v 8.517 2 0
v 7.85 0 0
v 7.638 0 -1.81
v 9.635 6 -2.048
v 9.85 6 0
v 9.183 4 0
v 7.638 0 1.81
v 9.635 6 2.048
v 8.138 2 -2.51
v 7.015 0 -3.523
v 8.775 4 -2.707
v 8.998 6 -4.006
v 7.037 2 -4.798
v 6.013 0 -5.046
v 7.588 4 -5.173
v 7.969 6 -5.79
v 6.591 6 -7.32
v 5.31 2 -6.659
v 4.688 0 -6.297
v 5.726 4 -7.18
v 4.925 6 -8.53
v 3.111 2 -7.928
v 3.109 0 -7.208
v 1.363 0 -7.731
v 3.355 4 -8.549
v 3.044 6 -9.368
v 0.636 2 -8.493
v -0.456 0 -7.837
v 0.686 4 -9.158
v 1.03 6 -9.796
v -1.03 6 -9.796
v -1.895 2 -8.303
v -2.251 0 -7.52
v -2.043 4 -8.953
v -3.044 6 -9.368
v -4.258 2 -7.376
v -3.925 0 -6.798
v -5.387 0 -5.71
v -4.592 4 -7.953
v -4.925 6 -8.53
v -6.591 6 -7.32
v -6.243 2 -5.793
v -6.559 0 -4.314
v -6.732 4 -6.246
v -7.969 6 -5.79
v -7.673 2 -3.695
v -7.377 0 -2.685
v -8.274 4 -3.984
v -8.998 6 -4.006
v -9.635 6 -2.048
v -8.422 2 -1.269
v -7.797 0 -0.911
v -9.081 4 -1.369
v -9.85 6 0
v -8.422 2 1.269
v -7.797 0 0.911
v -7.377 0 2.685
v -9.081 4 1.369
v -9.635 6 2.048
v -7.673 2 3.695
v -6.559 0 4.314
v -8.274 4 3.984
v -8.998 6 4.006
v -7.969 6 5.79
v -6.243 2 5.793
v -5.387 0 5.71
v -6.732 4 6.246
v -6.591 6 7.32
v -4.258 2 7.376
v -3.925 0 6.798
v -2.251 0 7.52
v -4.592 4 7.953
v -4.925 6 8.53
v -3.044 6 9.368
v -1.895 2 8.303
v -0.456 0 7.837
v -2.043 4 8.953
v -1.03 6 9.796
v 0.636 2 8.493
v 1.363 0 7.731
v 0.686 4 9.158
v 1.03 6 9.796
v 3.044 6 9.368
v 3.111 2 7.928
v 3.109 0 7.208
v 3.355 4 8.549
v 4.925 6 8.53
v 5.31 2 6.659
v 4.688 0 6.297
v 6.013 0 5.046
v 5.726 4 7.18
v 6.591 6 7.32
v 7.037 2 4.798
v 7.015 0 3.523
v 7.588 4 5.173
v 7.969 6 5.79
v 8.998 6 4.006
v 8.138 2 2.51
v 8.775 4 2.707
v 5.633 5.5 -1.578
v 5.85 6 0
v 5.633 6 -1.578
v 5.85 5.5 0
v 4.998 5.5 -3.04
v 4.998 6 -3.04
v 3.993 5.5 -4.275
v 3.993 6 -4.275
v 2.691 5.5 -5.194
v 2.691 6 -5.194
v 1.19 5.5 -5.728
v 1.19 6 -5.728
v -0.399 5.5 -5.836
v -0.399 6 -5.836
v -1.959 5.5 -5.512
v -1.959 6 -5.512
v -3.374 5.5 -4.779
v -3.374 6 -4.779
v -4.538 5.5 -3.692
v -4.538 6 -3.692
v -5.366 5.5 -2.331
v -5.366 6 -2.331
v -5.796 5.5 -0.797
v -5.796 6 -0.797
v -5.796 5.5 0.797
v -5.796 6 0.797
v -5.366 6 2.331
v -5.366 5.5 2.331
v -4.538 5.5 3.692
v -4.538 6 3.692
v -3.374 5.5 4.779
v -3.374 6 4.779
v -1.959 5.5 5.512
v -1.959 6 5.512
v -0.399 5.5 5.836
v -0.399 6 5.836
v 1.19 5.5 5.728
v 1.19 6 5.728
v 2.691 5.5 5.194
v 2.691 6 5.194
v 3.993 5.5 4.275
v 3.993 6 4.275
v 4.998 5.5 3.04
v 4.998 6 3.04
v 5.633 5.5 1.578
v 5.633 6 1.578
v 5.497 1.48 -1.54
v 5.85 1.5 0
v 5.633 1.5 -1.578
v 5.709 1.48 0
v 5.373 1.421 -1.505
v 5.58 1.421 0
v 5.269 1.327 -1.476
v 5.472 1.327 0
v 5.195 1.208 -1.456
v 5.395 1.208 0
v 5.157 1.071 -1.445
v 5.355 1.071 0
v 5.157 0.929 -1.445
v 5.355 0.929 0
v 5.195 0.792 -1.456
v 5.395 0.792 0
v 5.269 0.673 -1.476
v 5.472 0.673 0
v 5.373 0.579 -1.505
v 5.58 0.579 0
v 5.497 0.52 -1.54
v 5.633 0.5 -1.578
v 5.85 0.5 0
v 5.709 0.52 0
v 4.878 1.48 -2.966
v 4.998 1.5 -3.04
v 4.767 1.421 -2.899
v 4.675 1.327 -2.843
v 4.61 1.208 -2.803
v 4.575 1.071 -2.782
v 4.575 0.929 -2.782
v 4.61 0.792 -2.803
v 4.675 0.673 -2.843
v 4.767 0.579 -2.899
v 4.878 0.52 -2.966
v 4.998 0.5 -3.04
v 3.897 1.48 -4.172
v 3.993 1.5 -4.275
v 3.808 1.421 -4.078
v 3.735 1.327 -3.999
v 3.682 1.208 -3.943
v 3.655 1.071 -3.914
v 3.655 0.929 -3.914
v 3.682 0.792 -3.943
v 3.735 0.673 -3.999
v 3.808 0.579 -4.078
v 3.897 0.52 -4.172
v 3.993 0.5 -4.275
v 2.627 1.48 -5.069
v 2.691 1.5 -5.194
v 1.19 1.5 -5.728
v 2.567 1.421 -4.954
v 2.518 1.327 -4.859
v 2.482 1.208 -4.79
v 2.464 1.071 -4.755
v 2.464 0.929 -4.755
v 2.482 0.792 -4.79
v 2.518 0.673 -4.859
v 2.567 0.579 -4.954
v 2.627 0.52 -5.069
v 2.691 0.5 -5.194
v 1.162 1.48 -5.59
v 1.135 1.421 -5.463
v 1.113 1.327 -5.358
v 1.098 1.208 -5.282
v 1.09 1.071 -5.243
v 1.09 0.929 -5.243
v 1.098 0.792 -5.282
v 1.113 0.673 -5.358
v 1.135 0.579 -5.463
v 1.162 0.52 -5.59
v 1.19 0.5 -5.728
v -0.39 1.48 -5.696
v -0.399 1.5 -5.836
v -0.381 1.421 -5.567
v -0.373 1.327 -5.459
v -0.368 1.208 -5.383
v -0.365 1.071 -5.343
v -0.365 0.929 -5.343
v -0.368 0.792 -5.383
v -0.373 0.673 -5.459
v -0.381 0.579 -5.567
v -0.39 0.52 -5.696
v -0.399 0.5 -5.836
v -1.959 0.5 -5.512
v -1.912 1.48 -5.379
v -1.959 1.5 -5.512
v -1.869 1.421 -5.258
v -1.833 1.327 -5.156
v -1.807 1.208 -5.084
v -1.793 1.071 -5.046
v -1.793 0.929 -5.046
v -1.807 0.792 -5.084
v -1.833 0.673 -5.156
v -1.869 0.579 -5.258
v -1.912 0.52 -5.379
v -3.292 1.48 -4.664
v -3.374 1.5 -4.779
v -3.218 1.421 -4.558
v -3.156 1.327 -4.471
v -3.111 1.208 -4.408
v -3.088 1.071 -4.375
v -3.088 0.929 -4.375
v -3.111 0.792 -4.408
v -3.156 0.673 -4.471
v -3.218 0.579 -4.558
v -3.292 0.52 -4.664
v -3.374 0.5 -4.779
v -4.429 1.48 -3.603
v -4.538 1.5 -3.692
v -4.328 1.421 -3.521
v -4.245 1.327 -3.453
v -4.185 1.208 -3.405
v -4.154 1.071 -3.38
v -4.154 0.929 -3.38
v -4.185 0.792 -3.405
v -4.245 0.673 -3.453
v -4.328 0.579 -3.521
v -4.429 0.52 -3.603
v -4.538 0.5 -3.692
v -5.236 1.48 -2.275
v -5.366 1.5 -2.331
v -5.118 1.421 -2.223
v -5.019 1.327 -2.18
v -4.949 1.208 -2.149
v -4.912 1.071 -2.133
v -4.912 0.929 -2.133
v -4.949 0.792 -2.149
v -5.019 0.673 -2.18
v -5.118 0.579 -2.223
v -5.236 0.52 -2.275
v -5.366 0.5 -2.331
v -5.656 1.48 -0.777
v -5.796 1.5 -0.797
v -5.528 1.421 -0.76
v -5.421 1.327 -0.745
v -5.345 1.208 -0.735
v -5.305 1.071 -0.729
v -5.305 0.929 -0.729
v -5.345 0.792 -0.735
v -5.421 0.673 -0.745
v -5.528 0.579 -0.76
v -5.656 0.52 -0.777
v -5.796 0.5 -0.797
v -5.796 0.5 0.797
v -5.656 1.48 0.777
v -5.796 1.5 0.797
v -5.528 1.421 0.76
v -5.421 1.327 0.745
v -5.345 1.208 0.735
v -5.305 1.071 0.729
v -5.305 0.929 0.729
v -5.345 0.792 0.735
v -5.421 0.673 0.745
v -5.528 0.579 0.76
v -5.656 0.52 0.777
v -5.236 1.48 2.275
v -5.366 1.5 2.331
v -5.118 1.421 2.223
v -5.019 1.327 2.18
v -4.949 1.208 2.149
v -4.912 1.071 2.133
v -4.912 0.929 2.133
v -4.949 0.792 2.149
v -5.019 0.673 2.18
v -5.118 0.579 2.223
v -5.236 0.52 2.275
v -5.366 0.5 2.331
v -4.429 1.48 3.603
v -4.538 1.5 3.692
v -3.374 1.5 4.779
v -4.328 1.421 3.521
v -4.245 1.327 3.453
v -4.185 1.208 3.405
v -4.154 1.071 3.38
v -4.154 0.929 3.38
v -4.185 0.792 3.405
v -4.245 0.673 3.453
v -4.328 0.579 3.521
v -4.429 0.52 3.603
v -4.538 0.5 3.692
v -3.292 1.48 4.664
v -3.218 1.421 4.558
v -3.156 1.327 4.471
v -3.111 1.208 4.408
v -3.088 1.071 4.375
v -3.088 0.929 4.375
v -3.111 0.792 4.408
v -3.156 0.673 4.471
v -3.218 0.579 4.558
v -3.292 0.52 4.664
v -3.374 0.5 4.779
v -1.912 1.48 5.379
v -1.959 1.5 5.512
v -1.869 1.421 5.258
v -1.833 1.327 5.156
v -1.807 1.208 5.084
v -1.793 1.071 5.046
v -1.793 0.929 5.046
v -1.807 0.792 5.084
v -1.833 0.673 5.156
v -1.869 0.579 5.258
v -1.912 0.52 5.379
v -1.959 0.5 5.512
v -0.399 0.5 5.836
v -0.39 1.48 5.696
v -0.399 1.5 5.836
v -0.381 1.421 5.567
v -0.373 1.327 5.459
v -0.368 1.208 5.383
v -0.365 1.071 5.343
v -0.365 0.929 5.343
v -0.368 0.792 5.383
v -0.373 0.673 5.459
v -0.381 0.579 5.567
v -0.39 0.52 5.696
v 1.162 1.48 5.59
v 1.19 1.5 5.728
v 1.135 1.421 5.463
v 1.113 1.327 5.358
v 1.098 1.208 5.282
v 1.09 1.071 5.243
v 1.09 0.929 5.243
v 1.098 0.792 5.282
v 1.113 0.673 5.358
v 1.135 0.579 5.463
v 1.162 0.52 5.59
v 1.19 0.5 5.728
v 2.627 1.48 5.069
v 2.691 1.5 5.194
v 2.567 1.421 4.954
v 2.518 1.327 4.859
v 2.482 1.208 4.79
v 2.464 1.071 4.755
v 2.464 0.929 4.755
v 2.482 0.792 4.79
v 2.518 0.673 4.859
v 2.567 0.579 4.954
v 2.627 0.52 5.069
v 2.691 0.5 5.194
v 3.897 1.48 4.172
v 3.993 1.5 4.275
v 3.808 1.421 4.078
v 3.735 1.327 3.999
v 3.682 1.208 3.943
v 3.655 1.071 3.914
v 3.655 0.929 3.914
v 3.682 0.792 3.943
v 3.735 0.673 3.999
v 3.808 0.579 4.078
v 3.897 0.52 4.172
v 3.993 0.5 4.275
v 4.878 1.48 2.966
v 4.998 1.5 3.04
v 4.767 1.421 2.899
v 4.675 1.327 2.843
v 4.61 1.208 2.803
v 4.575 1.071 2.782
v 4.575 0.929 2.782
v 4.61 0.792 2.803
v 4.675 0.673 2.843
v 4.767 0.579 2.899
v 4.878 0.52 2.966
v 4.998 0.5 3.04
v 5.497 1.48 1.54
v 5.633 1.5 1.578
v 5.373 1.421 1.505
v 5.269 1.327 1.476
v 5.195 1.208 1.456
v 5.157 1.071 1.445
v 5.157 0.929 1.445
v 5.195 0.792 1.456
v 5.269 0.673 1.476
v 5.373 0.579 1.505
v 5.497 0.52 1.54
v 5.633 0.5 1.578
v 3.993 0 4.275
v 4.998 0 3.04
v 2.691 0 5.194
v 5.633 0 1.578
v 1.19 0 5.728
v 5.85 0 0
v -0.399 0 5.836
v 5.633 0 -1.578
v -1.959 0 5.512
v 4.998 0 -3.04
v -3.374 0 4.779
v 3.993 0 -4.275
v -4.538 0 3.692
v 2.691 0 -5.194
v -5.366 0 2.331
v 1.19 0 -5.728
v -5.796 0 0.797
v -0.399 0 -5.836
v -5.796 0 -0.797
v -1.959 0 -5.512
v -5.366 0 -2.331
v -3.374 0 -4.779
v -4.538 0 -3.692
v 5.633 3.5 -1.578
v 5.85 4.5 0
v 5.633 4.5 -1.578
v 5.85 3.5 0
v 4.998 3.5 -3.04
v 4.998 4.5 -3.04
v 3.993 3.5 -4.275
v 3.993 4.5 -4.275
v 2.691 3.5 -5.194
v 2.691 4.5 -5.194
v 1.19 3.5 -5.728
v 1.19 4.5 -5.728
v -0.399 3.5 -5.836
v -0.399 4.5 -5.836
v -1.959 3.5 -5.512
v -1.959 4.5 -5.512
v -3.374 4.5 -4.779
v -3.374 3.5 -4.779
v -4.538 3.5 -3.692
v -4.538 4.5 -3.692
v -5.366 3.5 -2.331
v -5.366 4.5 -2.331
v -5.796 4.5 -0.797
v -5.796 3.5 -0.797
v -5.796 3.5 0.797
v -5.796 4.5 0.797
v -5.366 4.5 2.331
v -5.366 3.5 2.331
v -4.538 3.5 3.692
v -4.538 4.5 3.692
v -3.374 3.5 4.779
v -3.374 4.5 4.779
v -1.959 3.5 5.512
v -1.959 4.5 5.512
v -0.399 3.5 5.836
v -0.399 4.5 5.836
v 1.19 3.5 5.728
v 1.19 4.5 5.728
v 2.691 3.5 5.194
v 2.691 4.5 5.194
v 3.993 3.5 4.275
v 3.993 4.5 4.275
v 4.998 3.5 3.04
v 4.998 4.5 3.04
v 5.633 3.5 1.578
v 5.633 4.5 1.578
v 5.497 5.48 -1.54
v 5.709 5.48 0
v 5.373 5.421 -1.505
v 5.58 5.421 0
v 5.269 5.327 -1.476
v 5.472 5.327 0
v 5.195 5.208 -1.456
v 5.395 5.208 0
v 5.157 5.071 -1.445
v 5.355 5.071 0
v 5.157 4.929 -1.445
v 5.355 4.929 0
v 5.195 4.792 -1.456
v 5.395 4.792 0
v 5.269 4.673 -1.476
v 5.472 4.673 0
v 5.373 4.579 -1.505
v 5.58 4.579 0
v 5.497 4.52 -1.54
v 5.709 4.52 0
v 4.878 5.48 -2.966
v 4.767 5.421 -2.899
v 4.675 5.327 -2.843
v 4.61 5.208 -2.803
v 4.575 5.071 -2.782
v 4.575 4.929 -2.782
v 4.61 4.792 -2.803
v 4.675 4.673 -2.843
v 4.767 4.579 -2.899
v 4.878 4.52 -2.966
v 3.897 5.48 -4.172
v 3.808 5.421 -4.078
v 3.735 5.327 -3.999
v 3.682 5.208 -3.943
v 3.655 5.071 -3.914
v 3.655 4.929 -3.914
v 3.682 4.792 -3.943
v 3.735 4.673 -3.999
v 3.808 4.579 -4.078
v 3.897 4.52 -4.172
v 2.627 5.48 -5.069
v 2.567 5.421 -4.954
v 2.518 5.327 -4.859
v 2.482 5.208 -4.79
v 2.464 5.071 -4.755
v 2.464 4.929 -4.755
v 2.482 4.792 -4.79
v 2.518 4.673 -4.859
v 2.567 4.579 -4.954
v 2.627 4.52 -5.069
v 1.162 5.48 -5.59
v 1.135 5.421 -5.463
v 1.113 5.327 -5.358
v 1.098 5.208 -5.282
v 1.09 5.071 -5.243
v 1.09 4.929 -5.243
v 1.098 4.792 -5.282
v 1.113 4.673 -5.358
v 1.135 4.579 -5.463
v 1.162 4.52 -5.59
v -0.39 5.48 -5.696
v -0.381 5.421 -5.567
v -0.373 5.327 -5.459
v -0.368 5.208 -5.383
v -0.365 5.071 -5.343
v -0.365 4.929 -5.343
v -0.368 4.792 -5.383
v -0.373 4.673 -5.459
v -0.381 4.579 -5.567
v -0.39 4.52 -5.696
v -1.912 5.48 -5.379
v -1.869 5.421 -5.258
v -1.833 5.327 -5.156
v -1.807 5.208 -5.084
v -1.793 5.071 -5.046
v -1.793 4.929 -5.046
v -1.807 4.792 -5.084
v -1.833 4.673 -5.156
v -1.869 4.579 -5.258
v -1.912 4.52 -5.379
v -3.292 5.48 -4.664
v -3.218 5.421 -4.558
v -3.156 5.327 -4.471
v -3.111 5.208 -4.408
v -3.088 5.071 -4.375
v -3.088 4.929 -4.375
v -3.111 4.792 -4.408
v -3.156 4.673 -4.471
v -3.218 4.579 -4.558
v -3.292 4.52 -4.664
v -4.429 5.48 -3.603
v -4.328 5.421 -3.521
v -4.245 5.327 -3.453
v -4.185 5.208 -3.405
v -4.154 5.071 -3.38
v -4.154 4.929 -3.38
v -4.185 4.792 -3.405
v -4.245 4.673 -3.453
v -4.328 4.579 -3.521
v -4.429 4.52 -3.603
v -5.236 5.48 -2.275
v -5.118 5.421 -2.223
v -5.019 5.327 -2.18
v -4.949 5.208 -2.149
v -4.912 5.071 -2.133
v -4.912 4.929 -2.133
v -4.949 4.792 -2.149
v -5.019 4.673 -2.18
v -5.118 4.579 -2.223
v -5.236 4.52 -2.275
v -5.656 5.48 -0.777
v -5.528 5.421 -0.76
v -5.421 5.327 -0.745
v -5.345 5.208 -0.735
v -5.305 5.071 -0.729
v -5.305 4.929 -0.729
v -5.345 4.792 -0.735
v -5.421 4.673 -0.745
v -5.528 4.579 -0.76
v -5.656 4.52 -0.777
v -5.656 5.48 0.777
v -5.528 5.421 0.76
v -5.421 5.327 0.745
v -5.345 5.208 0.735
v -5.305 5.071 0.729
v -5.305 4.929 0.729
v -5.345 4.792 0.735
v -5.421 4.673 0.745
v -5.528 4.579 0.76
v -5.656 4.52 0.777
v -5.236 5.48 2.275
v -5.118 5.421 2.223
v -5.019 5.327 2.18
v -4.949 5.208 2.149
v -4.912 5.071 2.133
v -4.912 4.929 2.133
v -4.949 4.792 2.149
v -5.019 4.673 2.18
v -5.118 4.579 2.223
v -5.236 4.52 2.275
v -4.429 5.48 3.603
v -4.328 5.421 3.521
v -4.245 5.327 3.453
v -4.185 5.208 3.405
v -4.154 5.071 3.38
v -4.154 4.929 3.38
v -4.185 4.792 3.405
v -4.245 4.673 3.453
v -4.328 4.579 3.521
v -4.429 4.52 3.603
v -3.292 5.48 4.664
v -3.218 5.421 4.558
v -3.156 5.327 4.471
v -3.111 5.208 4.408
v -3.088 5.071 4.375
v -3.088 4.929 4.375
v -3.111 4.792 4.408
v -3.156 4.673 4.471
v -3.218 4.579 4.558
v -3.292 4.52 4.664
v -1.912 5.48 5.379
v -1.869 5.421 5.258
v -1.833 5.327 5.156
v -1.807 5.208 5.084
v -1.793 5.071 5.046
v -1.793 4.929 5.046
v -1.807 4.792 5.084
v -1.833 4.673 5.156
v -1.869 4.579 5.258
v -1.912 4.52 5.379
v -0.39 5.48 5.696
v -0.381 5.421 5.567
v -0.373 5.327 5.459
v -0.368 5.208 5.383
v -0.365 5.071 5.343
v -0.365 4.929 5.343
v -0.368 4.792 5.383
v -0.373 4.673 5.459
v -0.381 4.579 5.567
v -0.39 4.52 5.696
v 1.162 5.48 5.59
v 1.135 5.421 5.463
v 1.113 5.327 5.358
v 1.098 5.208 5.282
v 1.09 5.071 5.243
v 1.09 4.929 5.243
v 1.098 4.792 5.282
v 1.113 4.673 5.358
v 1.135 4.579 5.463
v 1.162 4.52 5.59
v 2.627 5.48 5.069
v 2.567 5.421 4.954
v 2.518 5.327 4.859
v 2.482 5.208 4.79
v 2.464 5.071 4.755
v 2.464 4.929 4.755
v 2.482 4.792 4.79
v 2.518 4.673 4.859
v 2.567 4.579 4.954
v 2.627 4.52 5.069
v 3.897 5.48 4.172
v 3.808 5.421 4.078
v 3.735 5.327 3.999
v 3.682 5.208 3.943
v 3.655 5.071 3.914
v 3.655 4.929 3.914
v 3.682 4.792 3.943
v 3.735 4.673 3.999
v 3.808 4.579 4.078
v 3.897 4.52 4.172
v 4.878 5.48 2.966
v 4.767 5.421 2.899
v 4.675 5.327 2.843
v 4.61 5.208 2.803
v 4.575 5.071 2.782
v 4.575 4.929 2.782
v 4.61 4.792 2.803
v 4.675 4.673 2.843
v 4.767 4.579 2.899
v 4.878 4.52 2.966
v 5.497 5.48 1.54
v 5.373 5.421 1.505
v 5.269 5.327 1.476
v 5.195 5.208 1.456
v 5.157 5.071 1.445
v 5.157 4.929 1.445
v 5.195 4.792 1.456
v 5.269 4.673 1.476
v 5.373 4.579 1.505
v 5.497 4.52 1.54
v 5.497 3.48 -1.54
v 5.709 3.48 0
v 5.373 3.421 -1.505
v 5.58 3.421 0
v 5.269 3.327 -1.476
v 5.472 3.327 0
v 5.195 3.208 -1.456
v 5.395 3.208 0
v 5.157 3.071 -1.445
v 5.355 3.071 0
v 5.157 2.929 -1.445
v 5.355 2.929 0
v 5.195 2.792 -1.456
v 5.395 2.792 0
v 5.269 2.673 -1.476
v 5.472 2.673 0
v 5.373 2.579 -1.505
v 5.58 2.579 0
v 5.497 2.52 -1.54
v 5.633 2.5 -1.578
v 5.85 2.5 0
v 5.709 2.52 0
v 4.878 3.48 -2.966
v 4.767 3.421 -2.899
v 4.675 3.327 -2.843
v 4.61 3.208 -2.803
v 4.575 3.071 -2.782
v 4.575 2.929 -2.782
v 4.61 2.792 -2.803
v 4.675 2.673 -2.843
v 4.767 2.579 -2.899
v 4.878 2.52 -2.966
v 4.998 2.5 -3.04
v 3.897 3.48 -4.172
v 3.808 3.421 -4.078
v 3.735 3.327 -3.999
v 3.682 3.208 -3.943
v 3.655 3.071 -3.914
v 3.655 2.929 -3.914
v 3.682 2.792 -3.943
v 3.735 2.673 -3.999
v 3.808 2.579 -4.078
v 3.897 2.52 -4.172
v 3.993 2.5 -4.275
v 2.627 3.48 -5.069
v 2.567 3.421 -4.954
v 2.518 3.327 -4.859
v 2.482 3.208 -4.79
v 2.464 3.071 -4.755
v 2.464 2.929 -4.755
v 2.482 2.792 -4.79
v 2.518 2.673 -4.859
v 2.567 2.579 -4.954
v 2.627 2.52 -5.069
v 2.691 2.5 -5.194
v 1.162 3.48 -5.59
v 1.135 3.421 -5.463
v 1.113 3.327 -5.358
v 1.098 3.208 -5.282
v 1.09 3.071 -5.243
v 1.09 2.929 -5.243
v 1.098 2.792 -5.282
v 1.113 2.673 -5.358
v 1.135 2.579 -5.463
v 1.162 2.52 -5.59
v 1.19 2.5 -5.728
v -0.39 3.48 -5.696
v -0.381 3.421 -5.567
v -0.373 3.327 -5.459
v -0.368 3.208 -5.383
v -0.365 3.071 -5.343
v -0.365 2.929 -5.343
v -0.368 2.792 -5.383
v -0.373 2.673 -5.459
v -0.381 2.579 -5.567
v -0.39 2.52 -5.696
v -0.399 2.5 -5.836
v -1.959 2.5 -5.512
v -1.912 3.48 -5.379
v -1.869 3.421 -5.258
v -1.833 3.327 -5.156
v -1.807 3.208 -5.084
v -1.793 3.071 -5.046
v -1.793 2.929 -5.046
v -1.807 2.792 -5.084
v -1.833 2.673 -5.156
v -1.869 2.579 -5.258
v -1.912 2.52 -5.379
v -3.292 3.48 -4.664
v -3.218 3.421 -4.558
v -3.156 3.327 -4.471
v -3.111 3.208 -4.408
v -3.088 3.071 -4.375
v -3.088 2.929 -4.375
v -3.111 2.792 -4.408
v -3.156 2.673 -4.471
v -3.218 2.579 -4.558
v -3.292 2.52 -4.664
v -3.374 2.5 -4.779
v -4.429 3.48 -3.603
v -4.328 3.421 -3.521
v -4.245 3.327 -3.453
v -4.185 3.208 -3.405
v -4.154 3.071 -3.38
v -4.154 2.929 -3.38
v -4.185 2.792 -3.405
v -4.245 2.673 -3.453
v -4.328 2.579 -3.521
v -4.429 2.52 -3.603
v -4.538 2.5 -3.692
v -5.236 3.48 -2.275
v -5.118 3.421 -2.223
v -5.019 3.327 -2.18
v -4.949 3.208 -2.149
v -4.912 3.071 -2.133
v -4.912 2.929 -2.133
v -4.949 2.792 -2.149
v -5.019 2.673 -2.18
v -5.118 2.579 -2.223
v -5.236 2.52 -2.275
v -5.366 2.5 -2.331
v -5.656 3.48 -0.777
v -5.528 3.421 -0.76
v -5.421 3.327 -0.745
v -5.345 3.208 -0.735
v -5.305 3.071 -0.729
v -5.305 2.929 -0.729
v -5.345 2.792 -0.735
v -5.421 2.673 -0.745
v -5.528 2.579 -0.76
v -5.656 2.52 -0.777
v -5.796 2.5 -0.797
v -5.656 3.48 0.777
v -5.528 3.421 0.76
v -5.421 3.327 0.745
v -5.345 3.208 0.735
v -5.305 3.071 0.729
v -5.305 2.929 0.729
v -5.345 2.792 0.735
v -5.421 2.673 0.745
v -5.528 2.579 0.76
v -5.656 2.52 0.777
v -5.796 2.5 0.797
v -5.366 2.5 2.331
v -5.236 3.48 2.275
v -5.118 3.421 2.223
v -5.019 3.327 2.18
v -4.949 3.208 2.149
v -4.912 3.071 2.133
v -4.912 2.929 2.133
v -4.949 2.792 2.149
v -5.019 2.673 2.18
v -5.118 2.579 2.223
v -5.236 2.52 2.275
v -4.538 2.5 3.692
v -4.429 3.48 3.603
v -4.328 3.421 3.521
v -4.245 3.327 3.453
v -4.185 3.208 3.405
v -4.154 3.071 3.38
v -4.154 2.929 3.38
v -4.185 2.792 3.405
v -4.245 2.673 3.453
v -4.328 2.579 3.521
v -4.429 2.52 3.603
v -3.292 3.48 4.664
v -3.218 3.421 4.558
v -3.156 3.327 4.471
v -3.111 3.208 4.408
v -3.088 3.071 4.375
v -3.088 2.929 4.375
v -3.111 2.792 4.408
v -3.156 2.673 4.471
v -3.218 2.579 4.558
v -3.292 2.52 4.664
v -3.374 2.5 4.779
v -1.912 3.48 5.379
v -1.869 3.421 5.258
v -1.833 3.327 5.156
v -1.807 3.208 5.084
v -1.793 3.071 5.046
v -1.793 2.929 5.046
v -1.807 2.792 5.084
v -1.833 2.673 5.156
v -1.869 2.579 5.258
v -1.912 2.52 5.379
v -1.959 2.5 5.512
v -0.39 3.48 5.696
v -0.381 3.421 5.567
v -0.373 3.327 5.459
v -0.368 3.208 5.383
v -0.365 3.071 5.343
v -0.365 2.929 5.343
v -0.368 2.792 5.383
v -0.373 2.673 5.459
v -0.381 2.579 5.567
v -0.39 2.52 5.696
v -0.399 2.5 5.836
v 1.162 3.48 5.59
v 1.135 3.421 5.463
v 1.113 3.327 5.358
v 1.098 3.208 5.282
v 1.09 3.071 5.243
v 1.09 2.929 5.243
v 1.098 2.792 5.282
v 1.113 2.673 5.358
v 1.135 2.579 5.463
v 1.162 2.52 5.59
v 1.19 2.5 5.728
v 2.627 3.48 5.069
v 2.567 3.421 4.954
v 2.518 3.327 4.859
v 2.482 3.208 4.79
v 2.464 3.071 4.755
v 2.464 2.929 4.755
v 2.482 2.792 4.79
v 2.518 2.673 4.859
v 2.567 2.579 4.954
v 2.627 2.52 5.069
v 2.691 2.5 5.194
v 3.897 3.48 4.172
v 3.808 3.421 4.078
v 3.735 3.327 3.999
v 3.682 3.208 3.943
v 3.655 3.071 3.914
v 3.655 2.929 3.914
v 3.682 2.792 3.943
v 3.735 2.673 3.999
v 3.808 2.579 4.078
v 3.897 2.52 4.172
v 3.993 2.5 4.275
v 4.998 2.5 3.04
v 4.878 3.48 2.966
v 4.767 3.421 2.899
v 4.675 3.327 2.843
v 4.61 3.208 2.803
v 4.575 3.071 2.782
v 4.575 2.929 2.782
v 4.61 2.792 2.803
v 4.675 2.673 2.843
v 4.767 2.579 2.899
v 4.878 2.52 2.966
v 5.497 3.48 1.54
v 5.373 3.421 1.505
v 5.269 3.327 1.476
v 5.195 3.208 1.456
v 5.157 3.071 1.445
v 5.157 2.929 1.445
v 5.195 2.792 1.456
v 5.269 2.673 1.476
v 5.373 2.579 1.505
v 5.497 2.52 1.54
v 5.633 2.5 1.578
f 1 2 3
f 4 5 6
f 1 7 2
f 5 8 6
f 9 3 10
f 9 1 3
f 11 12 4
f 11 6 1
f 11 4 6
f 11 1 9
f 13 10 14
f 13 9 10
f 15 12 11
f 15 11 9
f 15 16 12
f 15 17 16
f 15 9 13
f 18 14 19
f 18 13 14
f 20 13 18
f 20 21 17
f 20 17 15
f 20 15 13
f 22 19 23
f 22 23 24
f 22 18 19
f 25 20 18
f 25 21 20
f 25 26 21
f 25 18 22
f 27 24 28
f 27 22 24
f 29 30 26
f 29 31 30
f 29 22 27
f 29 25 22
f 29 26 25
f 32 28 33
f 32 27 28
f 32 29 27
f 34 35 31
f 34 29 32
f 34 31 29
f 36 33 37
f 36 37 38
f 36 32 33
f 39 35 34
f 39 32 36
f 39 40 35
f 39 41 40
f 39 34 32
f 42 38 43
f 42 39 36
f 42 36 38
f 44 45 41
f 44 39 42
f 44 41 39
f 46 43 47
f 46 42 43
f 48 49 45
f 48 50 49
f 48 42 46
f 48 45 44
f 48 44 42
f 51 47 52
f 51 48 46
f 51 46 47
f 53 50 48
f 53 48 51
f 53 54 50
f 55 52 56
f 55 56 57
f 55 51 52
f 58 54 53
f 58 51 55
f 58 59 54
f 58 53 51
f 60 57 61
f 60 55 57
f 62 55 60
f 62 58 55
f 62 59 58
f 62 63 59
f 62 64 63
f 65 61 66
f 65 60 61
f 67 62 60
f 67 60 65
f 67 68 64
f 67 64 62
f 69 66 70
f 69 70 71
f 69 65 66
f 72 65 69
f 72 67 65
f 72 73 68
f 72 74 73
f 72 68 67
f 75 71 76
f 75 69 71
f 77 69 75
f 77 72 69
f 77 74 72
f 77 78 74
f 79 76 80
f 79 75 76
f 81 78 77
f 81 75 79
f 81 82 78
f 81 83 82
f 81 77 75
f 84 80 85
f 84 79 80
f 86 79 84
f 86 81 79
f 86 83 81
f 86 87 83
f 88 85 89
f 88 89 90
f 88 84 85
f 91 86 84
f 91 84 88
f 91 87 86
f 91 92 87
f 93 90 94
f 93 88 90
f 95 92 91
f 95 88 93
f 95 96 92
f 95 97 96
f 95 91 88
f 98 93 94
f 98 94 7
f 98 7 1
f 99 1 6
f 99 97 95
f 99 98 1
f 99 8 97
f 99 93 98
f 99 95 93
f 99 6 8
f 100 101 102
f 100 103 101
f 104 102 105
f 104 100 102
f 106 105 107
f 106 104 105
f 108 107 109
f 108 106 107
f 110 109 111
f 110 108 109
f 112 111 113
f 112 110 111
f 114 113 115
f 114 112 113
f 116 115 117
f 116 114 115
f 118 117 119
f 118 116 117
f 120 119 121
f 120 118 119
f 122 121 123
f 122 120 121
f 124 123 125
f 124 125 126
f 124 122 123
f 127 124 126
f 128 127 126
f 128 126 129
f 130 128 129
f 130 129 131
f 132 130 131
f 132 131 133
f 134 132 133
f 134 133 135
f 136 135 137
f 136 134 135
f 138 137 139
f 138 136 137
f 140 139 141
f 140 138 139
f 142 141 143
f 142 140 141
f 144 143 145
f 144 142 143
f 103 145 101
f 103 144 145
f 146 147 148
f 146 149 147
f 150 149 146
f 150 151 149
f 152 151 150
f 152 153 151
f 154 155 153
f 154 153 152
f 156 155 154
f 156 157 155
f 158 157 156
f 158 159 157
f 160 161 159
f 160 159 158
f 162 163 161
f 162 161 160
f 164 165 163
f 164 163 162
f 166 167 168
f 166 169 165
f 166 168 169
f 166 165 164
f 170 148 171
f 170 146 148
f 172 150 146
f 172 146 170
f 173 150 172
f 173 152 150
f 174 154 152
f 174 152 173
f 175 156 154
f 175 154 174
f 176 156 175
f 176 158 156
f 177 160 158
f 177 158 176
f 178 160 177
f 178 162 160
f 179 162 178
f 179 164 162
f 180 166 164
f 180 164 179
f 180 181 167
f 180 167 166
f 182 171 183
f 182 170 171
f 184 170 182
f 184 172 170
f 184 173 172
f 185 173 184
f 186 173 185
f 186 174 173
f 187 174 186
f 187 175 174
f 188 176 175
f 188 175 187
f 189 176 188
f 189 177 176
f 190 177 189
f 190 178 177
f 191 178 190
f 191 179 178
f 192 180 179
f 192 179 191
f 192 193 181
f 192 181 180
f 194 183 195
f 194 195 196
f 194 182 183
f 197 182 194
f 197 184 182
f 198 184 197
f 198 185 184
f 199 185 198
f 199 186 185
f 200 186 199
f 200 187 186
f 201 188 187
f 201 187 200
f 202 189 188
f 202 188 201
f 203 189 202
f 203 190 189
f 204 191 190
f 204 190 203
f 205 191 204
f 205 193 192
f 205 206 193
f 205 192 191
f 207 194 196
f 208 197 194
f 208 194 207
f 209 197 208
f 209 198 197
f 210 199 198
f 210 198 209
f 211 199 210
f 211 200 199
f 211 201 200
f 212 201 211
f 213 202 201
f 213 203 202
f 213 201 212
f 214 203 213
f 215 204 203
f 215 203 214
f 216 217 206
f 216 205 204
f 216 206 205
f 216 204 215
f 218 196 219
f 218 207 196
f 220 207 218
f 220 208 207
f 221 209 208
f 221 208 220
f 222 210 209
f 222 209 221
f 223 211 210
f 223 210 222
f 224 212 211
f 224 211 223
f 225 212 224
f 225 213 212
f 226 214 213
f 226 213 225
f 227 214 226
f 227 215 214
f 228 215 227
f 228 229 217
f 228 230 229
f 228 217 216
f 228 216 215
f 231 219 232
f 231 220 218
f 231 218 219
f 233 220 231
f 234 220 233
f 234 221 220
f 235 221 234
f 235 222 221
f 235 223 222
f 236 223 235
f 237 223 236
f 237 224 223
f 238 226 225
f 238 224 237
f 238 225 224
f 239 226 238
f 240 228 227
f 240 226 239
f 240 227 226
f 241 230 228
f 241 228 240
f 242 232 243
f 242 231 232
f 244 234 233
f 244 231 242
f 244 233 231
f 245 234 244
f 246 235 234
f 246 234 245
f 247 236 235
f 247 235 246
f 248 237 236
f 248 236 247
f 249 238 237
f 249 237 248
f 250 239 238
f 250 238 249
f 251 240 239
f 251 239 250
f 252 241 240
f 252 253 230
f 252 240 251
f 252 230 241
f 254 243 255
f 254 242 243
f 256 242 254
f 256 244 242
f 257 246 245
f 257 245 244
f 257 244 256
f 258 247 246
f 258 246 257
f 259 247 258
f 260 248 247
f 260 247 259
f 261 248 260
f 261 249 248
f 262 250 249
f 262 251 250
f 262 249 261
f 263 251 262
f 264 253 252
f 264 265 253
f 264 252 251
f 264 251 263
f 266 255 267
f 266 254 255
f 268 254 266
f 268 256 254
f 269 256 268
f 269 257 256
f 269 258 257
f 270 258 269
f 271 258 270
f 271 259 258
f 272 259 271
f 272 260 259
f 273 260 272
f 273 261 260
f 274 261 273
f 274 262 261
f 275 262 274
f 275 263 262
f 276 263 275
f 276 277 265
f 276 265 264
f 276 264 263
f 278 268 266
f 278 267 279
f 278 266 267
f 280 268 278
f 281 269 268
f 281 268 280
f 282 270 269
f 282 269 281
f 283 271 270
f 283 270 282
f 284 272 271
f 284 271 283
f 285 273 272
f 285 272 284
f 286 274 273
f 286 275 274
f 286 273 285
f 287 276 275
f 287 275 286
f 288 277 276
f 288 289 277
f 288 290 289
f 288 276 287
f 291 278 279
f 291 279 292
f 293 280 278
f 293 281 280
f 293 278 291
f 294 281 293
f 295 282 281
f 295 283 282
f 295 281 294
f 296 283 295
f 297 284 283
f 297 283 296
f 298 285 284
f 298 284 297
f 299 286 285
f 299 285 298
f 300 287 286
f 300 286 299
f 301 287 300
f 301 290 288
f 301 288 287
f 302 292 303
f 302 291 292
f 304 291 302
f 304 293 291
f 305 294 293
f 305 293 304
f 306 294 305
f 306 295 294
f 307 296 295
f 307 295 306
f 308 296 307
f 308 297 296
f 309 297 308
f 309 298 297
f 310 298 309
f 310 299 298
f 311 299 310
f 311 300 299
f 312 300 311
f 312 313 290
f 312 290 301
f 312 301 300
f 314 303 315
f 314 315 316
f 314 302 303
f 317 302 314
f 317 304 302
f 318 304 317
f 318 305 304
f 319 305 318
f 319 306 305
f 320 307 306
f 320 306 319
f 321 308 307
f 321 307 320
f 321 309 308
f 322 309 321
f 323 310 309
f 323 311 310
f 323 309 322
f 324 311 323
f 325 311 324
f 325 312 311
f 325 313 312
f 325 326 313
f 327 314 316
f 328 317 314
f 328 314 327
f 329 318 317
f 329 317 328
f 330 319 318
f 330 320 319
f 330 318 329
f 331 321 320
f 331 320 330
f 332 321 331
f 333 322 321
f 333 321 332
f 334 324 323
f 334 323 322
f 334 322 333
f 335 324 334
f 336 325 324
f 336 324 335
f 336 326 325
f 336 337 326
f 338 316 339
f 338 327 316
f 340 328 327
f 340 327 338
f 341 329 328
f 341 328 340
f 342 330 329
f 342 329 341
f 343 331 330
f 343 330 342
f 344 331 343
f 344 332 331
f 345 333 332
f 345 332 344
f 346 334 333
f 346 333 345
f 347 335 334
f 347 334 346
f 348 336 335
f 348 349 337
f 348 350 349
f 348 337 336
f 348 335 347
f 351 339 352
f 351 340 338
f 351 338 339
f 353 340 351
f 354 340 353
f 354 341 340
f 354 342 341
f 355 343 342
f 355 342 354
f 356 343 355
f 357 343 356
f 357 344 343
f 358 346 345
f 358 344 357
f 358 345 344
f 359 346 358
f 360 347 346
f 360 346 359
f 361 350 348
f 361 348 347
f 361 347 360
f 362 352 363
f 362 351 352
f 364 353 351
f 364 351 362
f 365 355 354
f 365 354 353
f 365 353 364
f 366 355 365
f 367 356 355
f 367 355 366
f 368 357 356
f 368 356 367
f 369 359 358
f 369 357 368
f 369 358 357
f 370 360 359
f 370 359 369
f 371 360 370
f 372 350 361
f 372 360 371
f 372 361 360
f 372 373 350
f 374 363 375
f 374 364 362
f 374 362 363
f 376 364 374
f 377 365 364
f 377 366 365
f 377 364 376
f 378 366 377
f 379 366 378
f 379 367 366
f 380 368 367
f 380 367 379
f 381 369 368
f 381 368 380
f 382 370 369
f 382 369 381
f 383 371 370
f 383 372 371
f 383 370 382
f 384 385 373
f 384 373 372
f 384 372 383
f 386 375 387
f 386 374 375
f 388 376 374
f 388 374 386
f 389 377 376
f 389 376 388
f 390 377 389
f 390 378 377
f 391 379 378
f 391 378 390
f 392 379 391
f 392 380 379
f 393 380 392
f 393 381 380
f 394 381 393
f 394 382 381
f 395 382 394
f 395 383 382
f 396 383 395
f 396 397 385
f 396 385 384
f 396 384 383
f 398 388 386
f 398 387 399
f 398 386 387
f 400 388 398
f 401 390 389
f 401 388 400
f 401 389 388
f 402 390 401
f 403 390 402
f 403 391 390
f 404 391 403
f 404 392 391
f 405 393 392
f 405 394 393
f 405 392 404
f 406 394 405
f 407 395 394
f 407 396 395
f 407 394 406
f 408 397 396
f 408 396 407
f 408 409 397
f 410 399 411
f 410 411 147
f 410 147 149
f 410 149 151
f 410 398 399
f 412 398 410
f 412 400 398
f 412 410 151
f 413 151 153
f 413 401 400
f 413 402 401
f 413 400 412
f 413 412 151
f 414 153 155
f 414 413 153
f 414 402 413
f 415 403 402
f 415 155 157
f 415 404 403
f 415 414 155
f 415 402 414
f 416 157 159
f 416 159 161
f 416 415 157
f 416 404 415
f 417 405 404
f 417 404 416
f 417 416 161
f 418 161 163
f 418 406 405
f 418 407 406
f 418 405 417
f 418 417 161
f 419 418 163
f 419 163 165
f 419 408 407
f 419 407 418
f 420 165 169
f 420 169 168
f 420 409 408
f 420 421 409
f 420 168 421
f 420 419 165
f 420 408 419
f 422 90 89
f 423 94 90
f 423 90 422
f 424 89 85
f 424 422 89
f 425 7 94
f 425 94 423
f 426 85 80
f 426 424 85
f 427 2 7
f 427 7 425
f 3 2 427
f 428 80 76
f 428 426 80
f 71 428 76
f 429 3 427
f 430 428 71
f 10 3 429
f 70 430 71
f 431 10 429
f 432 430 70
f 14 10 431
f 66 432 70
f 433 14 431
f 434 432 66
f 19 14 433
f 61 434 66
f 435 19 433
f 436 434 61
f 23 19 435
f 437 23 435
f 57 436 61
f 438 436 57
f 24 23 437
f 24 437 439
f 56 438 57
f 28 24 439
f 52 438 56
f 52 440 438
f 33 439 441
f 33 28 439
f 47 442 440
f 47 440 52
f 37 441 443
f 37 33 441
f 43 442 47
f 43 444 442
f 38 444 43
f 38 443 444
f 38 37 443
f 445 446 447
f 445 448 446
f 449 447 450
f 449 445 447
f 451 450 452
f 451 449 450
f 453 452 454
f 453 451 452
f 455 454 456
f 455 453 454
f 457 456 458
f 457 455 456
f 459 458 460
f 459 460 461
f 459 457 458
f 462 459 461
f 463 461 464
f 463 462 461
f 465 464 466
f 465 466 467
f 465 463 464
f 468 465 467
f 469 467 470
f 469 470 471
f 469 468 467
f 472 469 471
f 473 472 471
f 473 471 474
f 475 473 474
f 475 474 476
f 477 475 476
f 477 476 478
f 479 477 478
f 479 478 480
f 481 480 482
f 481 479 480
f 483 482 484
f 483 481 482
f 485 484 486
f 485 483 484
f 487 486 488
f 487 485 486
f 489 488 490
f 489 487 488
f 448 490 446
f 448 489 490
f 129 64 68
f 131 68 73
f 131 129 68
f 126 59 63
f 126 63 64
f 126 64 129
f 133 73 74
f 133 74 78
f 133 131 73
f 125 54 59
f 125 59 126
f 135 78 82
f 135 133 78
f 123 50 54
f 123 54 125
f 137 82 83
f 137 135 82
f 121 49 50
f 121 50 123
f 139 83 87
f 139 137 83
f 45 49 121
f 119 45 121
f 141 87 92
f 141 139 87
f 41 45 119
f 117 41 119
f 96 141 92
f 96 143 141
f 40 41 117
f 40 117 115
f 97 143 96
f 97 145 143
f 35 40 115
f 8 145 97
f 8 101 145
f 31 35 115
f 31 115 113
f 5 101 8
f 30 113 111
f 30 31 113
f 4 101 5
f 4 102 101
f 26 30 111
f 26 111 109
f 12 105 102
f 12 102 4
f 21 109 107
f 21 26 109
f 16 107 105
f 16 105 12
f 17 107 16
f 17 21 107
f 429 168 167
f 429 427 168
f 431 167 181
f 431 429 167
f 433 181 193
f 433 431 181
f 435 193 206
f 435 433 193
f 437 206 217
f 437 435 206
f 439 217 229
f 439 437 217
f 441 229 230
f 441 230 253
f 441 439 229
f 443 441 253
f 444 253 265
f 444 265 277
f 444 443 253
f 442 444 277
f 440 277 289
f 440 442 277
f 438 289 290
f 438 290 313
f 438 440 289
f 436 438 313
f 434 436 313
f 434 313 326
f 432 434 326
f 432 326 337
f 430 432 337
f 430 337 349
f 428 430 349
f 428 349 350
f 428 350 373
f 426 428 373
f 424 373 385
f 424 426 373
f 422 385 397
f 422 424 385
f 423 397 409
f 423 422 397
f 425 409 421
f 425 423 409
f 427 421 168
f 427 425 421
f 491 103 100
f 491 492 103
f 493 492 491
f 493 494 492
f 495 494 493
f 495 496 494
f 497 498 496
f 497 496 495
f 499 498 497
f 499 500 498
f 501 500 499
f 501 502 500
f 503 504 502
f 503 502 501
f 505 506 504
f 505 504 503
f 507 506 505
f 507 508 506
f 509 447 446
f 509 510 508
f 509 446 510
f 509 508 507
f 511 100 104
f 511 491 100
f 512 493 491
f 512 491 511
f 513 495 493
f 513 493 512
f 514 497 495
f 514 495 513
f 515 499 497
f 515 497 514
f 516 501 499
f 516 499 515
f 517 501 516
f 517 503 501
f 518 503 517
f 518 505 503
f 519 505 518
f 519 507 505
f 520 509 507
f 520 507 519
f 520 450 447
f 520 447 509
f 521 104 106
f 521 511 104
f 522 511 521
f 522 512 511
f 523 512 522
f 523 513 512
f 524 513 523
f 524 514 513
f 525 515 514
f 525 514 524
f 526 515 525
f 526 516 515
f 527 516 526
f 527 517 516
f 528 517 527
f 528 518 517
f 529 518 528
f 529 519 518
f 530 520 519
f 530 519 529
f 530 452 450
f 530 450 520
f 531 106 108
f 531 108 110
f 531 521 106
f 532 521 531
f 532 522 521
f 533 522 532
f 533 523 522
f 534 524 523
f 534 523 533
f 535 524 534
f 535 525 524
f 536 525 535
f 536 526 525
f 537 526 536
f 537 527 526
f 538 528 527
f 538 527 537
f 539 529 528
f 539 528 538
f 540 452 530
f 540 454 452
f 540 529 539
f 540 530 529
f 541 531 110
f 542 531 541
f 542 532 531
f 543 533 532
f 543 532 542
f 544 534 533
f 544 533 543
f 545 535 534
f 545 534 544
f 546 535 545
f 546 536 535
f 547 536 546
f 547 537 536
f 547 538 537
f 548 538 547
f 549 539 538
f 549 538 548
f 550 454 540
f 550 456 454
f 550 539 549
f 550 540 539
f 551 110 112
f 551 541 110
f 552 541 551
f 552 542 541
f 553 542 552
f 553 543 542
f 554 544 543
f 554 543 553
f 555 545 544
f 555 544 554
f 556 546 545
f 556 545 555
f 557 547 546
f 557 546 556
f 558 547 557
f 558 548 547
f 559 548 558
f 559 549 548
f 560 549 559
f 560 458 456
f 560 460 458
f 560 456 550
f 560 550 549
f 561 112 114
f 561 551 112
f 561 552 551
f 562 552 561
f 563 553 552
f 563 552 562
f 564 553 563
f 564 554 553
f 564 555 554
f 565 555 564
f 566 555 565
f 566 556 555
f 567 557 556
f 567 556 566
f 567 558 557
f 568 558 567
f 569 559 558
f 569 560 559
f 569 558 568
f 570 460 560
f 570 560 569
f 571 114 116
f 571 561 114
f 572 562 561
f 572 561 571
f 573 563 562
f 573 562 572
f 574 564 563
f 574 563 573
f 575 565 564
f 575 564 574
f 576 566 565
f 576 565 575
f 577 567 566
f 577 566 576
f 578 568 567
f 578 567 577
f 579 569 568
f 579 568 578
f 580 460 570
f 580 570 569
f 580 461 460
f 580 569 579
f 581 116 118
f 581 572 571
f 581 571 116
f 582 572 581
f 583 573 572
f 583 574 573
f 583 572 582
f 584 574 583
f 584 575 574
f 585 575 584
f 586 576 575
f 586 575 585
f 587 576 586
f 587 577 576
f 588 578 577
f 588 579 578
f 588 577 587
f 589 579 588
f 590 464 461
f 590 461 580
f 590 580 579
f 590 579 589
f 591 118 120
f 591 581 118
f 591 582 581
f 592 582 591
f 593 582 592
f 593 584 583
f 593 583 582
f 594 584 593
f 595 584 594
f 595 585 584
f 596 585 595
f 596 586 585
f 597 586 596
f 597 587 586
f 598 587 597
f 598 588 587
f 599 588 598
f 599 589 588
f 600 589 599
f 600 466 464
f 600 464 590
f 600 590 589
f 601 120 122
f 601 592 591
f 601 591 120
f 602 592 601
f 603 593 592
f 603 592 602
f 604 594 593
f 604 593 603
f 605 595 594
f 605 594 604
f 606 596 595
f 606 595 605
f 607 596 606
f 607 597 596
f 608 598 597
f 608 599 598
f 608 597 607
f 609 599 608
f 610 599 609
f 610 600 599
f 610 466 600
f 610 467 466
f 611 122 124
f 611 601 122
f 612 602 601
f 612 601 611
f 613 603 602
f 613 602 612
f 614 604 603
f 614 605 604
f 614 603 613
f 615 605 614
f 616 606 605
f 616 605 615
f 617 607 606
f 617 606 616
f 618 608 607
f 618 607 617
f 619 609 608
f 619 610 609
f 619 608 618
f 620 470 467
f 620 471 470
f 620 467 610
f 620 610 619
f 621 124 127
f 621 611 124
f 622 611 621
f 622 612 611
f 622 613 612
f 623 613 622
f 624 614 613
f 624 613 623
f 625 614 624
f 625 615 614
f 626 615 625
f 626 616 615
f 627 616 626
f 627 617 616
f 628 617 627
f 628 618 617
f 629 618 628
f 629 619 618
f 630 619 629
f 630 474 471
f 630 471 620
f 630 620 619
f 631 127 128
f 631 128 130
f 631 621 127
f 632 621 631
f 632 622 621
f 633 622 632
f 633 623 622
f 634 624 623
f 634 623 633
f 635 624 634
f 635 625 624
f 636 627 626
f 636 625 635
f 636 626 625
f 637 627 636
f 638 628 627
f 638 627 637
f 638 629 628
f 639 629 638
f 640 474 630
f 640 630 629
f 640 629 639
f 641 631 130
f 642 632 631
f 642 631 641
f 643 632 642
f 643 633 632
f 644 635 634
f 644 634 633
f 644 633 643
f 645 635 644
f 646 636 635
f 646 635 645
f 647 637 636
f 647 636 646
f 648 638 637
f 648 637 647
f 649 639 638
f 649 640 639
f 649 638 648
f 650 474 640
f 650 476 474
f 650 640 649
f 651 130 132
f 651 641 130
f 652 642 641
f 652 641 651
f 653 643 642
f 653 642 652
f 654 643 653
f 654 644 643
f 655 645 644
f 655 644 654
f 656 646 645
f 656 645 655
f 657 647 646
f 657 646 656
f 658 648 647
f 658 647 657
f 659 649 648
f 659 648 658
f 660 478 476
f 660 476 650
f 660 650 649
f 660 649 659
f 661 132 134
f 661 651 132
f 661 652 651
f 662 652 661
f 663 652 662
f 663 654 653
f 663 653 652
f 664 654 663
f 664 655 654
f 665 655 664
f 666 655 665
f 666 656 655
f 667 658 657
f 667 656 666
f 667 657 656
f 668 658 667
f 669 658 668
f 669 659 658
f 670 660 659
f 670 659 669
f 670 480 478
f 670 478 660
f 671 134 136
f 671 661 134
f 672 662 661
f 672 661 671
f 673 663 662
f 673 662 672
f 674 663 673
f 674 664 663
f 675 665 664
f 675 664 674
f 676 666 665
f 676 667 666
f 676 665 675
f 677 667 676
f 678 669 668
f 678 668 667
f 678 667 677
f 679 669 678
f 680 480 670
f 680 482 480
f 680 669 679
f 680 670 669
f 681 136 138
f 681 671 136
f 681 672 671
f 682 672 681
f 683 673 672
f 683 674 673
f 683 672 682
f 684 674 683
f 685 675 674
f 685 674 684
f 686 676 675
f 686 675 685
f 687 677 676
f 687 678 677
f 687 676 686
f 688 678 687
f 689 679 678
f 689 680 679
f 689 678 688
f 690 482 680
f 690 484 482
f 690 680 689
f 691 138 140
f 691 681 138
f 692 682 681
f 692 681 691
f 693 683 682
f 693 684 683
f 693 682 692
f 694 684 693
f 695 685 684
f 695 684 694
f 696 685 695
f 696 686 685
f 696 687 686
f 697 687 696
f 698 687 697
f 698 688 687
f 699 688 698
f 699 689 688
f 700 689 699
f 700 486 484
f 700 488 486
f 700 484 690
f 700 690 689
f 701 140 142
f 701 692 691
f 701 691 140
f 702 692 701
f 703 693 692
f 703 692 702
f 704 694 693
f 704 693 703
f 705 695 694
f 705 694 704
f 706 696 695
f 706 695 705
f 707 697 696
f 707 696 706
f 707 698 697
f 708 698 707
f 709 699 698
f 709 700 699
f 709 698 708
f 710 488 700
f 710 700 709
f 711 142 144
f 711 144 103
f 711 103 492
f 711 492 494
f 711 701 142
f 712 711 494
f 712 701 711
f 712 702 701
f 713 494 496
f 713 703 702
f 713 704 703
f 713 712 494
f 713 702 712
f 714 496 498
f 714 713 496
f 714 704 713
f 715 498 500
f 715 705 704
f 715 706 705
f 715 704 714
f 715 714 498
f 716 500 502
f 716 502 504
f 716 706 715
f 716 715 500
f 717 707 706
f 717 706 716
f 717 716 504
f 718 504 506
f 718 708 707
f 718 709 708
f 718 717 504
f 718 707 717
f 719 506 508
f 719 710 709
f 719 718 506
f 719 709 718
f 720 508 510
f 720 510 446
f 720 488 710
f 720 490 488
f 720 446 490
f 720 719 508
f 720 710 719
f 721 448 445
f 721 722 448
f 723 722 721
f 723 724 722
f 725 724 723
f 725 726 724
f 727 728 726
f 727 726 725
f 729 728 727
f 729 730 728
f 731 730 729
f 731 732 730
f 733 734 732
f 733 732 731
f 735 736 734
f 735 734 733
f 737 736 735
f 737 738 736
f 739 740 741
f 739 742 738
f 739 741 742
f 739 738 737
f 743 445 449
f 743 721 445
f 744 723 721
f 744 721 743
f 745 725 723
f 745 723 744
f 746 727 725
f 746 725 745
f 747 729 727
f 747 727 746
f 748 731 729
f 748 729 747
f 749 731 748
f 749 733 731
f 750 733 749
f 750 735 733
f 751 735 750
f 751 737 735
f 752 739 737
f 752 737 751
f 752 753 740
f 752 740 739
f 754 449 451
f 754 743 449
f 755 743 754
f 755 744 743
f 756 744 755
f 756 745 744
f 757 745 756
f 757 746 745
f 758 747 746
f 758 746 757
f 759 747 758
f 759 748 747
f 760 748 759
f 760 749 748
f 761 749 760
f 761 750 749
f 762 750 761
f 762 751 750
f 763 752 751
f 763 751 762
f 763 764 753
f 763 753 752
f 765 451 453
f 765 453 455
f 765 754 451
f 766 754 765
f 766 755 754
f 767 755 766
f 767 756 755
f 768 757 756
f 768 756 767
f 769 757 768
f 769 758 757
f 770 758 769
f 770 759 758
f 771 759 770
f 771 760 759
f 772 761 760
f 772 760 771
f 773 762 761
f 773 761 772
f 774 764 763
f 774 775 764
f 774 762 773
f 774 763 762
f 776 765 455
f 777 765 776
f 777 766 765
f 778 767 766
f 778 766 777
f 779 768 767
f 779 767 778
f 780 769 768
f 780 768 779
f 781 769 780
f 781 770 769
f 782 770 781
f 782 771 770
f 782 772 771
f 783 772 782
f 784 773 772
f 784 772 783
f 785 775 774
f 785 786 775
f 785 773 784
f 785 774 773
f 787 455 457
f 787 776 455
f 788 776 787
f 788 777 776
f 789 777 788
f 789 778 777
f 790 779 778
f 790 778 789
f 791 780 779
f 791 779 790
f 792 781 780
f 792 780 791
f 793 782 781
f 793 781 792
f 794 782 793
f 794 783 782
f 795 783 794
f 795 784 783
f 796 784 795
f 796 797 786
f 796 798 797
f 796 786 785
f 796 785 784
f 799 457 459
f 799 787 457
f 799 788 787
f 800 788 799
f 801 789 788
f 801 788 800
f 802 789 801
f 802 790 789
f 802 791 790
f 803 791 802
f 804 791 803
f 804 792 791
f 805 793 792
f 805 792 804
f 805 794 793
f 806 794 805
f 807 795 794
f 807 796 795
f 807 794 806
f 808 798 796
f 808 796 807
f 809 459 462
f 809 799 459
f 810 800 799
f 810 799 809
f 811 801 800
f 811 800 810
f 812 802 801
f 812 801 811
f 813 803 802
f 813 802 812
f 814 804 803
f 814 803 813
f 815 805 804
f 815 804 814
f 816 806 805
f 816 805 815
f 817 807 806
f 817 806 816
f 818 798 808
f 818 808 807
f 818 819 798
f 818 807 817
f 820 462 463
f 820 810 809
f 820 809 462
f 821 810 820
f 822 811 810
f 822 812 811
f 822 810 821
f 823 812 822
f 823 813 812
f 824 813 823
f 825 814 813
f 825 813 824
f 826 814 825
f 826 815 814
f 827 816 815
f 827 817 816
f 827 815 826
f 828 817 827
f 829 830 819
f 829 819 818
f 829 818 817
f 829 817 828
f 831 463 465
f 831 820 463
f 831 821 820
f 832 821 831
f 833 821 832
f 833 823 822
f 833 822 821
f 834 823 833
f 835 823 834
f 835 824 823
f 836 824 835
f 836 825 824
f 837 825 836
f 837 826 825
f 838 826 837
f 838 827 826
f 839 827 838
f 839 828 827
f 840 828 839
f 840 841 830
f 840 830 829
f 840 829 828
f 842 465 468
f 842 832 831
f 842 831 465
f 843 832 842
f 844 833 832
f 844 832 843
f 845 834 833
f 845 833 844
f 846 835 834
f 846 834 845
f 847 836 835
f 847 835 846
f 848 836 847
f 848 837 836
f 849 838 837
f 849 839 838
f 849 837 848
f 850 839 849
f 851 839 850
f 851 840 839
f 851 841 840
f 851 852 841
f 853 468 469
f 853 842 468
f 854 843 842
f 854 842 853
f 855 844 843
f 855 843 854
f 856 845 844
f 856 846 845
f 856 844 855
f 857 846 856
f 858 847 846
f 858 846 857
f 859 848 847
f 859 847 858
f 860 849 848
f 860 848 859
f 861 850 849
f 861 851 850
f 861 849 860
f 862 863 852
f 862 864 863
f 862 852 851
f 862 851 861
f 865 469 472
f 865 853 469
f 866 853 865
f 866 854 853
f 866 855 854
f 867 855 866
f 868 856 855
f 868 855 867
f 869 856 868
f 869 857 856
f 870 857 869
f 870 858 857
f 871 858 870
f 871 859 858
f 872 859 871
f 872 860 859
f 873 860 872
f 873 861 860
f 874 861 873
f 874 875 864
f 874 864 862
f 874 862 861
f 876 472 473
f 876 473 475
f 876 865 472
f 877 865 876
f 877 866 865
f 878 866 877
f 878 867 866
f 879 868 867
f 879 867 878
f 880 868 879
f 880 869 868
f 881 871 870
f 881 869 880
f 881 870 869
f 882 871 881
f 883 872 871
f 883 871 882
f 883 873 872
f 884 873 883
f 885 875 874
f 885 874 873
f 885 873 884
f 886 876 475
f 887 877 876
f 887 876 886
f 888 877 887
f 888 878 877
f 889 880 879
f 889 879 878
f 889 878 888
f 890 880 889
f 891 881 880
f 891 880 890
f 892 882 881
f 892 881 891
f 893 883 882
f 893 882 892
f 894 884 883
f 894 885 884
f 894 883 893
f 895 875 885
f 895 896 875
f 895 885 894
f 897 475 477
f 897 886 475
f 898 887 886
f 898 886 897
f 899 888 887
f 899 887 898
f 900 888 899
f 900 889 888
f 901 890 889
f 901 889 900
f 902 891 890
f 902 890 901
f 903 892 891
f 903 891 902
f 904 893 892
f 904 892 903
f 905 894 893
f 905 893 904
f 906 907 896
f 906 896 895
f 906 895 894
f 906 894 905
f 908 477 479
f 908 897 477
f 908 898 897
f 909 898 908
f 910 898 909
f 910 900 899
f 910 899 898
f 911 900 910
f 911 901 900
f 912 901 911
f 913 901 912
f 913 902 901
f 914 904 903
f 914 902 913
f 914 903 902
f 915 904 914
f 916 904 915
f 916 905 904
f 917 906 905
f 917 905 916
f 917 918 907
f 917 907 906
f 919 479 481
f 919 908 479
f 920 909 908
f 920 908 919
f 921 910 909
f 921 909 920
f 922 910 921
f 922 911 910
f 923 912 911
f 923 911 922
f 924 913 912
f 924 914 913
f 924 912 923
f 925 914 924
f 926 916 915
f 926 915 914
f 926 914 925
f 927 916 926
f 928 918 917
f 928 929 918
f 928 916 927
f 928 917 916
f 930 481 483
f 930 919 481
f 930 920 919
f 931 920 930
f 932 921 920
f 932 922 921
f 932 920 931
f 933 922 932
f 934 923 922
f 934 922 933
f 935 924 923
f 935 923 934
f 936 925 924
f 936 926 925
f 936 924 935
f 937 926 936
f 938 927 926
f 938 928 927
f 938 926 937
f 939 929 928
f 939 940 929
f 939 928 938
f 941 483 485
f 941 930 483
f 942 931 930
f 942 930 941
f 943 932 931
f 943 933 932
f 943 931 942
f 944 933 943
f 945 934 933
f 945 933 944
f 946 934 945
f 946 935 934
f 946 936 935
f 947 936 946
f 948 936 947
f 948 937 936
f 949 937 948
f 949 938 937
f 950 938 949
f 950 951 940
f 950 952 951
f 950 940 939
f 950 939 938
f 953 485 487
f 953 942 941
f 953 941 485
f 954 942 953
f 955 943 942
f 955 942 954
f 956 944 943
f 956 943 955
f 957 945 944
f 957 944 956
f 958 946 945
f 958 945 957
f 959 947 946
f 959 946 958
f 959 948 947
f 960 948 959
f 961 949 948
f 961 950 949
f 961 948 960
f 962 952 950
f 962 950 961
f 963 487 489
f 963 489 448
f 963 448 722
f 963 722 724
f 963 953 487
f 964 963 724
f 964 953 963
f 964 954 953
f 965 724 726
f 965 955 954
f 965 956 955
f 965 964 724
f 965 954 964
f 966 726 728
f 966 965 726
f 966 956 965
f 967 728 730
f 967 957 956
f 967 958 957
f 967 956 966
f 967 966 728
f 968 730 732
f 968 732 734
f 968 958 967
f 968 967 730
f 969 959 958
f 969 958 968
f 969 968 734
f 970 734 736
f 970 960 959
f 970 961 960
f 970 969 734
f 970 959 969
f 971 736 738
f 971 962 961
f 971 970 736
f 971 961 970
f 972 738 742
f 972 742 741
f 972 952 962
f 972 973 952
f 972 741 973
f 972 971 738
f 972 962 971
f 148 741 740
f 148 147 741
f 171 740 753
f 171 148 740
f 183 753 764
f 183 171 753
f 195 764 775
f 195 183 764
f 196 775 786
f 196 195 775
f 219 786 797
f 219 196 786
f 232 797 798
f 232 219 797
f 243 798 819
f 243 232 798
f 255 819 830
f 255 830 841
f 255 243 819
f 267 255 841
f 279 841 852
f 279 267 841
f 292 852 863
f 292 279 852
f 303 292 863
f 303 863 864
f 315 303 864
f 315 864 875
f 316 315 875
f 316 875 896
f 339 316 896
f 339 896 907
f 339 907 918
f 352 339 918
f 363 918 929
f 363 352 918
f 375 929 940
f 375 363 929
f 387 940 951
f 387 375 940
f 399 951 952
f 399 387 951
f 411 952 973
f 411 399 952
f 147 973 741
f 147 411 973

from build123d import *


with BuildPart() as part:
    # Sketch1 → Revolve1 (revolve)
    with BuildSketch(Plane.XY):
        with BuildLine():
            Line((5.85, 0), (7.85, 0))
            Line((7.85, 0), (9.85, 6))
            Line((9.85, 6), (5.85, 6))
            Line((5.85, 6), (5.85, 5.5))
            ThreePointArc((5.85, 5.5), (5.35, 5), (5.85, 4.5))
            Line((5.85, 4.5), (5.85, 3.5))
            ThreePointArc((5.85, 3.5), (5.35, 3), (5.85, 2.5))
            Line((5.85, 2.5), (5.85, 1.5))
            ThreePointArc((5.85, 1.5), (5.35, 1), (5.85, 0.5))
            Line((5.85, 0.5), (5.85, 0))
        make_face()
    revolve(axis=Axis((0, 0, 0), (0, 1, 0)))


solid = part.part
